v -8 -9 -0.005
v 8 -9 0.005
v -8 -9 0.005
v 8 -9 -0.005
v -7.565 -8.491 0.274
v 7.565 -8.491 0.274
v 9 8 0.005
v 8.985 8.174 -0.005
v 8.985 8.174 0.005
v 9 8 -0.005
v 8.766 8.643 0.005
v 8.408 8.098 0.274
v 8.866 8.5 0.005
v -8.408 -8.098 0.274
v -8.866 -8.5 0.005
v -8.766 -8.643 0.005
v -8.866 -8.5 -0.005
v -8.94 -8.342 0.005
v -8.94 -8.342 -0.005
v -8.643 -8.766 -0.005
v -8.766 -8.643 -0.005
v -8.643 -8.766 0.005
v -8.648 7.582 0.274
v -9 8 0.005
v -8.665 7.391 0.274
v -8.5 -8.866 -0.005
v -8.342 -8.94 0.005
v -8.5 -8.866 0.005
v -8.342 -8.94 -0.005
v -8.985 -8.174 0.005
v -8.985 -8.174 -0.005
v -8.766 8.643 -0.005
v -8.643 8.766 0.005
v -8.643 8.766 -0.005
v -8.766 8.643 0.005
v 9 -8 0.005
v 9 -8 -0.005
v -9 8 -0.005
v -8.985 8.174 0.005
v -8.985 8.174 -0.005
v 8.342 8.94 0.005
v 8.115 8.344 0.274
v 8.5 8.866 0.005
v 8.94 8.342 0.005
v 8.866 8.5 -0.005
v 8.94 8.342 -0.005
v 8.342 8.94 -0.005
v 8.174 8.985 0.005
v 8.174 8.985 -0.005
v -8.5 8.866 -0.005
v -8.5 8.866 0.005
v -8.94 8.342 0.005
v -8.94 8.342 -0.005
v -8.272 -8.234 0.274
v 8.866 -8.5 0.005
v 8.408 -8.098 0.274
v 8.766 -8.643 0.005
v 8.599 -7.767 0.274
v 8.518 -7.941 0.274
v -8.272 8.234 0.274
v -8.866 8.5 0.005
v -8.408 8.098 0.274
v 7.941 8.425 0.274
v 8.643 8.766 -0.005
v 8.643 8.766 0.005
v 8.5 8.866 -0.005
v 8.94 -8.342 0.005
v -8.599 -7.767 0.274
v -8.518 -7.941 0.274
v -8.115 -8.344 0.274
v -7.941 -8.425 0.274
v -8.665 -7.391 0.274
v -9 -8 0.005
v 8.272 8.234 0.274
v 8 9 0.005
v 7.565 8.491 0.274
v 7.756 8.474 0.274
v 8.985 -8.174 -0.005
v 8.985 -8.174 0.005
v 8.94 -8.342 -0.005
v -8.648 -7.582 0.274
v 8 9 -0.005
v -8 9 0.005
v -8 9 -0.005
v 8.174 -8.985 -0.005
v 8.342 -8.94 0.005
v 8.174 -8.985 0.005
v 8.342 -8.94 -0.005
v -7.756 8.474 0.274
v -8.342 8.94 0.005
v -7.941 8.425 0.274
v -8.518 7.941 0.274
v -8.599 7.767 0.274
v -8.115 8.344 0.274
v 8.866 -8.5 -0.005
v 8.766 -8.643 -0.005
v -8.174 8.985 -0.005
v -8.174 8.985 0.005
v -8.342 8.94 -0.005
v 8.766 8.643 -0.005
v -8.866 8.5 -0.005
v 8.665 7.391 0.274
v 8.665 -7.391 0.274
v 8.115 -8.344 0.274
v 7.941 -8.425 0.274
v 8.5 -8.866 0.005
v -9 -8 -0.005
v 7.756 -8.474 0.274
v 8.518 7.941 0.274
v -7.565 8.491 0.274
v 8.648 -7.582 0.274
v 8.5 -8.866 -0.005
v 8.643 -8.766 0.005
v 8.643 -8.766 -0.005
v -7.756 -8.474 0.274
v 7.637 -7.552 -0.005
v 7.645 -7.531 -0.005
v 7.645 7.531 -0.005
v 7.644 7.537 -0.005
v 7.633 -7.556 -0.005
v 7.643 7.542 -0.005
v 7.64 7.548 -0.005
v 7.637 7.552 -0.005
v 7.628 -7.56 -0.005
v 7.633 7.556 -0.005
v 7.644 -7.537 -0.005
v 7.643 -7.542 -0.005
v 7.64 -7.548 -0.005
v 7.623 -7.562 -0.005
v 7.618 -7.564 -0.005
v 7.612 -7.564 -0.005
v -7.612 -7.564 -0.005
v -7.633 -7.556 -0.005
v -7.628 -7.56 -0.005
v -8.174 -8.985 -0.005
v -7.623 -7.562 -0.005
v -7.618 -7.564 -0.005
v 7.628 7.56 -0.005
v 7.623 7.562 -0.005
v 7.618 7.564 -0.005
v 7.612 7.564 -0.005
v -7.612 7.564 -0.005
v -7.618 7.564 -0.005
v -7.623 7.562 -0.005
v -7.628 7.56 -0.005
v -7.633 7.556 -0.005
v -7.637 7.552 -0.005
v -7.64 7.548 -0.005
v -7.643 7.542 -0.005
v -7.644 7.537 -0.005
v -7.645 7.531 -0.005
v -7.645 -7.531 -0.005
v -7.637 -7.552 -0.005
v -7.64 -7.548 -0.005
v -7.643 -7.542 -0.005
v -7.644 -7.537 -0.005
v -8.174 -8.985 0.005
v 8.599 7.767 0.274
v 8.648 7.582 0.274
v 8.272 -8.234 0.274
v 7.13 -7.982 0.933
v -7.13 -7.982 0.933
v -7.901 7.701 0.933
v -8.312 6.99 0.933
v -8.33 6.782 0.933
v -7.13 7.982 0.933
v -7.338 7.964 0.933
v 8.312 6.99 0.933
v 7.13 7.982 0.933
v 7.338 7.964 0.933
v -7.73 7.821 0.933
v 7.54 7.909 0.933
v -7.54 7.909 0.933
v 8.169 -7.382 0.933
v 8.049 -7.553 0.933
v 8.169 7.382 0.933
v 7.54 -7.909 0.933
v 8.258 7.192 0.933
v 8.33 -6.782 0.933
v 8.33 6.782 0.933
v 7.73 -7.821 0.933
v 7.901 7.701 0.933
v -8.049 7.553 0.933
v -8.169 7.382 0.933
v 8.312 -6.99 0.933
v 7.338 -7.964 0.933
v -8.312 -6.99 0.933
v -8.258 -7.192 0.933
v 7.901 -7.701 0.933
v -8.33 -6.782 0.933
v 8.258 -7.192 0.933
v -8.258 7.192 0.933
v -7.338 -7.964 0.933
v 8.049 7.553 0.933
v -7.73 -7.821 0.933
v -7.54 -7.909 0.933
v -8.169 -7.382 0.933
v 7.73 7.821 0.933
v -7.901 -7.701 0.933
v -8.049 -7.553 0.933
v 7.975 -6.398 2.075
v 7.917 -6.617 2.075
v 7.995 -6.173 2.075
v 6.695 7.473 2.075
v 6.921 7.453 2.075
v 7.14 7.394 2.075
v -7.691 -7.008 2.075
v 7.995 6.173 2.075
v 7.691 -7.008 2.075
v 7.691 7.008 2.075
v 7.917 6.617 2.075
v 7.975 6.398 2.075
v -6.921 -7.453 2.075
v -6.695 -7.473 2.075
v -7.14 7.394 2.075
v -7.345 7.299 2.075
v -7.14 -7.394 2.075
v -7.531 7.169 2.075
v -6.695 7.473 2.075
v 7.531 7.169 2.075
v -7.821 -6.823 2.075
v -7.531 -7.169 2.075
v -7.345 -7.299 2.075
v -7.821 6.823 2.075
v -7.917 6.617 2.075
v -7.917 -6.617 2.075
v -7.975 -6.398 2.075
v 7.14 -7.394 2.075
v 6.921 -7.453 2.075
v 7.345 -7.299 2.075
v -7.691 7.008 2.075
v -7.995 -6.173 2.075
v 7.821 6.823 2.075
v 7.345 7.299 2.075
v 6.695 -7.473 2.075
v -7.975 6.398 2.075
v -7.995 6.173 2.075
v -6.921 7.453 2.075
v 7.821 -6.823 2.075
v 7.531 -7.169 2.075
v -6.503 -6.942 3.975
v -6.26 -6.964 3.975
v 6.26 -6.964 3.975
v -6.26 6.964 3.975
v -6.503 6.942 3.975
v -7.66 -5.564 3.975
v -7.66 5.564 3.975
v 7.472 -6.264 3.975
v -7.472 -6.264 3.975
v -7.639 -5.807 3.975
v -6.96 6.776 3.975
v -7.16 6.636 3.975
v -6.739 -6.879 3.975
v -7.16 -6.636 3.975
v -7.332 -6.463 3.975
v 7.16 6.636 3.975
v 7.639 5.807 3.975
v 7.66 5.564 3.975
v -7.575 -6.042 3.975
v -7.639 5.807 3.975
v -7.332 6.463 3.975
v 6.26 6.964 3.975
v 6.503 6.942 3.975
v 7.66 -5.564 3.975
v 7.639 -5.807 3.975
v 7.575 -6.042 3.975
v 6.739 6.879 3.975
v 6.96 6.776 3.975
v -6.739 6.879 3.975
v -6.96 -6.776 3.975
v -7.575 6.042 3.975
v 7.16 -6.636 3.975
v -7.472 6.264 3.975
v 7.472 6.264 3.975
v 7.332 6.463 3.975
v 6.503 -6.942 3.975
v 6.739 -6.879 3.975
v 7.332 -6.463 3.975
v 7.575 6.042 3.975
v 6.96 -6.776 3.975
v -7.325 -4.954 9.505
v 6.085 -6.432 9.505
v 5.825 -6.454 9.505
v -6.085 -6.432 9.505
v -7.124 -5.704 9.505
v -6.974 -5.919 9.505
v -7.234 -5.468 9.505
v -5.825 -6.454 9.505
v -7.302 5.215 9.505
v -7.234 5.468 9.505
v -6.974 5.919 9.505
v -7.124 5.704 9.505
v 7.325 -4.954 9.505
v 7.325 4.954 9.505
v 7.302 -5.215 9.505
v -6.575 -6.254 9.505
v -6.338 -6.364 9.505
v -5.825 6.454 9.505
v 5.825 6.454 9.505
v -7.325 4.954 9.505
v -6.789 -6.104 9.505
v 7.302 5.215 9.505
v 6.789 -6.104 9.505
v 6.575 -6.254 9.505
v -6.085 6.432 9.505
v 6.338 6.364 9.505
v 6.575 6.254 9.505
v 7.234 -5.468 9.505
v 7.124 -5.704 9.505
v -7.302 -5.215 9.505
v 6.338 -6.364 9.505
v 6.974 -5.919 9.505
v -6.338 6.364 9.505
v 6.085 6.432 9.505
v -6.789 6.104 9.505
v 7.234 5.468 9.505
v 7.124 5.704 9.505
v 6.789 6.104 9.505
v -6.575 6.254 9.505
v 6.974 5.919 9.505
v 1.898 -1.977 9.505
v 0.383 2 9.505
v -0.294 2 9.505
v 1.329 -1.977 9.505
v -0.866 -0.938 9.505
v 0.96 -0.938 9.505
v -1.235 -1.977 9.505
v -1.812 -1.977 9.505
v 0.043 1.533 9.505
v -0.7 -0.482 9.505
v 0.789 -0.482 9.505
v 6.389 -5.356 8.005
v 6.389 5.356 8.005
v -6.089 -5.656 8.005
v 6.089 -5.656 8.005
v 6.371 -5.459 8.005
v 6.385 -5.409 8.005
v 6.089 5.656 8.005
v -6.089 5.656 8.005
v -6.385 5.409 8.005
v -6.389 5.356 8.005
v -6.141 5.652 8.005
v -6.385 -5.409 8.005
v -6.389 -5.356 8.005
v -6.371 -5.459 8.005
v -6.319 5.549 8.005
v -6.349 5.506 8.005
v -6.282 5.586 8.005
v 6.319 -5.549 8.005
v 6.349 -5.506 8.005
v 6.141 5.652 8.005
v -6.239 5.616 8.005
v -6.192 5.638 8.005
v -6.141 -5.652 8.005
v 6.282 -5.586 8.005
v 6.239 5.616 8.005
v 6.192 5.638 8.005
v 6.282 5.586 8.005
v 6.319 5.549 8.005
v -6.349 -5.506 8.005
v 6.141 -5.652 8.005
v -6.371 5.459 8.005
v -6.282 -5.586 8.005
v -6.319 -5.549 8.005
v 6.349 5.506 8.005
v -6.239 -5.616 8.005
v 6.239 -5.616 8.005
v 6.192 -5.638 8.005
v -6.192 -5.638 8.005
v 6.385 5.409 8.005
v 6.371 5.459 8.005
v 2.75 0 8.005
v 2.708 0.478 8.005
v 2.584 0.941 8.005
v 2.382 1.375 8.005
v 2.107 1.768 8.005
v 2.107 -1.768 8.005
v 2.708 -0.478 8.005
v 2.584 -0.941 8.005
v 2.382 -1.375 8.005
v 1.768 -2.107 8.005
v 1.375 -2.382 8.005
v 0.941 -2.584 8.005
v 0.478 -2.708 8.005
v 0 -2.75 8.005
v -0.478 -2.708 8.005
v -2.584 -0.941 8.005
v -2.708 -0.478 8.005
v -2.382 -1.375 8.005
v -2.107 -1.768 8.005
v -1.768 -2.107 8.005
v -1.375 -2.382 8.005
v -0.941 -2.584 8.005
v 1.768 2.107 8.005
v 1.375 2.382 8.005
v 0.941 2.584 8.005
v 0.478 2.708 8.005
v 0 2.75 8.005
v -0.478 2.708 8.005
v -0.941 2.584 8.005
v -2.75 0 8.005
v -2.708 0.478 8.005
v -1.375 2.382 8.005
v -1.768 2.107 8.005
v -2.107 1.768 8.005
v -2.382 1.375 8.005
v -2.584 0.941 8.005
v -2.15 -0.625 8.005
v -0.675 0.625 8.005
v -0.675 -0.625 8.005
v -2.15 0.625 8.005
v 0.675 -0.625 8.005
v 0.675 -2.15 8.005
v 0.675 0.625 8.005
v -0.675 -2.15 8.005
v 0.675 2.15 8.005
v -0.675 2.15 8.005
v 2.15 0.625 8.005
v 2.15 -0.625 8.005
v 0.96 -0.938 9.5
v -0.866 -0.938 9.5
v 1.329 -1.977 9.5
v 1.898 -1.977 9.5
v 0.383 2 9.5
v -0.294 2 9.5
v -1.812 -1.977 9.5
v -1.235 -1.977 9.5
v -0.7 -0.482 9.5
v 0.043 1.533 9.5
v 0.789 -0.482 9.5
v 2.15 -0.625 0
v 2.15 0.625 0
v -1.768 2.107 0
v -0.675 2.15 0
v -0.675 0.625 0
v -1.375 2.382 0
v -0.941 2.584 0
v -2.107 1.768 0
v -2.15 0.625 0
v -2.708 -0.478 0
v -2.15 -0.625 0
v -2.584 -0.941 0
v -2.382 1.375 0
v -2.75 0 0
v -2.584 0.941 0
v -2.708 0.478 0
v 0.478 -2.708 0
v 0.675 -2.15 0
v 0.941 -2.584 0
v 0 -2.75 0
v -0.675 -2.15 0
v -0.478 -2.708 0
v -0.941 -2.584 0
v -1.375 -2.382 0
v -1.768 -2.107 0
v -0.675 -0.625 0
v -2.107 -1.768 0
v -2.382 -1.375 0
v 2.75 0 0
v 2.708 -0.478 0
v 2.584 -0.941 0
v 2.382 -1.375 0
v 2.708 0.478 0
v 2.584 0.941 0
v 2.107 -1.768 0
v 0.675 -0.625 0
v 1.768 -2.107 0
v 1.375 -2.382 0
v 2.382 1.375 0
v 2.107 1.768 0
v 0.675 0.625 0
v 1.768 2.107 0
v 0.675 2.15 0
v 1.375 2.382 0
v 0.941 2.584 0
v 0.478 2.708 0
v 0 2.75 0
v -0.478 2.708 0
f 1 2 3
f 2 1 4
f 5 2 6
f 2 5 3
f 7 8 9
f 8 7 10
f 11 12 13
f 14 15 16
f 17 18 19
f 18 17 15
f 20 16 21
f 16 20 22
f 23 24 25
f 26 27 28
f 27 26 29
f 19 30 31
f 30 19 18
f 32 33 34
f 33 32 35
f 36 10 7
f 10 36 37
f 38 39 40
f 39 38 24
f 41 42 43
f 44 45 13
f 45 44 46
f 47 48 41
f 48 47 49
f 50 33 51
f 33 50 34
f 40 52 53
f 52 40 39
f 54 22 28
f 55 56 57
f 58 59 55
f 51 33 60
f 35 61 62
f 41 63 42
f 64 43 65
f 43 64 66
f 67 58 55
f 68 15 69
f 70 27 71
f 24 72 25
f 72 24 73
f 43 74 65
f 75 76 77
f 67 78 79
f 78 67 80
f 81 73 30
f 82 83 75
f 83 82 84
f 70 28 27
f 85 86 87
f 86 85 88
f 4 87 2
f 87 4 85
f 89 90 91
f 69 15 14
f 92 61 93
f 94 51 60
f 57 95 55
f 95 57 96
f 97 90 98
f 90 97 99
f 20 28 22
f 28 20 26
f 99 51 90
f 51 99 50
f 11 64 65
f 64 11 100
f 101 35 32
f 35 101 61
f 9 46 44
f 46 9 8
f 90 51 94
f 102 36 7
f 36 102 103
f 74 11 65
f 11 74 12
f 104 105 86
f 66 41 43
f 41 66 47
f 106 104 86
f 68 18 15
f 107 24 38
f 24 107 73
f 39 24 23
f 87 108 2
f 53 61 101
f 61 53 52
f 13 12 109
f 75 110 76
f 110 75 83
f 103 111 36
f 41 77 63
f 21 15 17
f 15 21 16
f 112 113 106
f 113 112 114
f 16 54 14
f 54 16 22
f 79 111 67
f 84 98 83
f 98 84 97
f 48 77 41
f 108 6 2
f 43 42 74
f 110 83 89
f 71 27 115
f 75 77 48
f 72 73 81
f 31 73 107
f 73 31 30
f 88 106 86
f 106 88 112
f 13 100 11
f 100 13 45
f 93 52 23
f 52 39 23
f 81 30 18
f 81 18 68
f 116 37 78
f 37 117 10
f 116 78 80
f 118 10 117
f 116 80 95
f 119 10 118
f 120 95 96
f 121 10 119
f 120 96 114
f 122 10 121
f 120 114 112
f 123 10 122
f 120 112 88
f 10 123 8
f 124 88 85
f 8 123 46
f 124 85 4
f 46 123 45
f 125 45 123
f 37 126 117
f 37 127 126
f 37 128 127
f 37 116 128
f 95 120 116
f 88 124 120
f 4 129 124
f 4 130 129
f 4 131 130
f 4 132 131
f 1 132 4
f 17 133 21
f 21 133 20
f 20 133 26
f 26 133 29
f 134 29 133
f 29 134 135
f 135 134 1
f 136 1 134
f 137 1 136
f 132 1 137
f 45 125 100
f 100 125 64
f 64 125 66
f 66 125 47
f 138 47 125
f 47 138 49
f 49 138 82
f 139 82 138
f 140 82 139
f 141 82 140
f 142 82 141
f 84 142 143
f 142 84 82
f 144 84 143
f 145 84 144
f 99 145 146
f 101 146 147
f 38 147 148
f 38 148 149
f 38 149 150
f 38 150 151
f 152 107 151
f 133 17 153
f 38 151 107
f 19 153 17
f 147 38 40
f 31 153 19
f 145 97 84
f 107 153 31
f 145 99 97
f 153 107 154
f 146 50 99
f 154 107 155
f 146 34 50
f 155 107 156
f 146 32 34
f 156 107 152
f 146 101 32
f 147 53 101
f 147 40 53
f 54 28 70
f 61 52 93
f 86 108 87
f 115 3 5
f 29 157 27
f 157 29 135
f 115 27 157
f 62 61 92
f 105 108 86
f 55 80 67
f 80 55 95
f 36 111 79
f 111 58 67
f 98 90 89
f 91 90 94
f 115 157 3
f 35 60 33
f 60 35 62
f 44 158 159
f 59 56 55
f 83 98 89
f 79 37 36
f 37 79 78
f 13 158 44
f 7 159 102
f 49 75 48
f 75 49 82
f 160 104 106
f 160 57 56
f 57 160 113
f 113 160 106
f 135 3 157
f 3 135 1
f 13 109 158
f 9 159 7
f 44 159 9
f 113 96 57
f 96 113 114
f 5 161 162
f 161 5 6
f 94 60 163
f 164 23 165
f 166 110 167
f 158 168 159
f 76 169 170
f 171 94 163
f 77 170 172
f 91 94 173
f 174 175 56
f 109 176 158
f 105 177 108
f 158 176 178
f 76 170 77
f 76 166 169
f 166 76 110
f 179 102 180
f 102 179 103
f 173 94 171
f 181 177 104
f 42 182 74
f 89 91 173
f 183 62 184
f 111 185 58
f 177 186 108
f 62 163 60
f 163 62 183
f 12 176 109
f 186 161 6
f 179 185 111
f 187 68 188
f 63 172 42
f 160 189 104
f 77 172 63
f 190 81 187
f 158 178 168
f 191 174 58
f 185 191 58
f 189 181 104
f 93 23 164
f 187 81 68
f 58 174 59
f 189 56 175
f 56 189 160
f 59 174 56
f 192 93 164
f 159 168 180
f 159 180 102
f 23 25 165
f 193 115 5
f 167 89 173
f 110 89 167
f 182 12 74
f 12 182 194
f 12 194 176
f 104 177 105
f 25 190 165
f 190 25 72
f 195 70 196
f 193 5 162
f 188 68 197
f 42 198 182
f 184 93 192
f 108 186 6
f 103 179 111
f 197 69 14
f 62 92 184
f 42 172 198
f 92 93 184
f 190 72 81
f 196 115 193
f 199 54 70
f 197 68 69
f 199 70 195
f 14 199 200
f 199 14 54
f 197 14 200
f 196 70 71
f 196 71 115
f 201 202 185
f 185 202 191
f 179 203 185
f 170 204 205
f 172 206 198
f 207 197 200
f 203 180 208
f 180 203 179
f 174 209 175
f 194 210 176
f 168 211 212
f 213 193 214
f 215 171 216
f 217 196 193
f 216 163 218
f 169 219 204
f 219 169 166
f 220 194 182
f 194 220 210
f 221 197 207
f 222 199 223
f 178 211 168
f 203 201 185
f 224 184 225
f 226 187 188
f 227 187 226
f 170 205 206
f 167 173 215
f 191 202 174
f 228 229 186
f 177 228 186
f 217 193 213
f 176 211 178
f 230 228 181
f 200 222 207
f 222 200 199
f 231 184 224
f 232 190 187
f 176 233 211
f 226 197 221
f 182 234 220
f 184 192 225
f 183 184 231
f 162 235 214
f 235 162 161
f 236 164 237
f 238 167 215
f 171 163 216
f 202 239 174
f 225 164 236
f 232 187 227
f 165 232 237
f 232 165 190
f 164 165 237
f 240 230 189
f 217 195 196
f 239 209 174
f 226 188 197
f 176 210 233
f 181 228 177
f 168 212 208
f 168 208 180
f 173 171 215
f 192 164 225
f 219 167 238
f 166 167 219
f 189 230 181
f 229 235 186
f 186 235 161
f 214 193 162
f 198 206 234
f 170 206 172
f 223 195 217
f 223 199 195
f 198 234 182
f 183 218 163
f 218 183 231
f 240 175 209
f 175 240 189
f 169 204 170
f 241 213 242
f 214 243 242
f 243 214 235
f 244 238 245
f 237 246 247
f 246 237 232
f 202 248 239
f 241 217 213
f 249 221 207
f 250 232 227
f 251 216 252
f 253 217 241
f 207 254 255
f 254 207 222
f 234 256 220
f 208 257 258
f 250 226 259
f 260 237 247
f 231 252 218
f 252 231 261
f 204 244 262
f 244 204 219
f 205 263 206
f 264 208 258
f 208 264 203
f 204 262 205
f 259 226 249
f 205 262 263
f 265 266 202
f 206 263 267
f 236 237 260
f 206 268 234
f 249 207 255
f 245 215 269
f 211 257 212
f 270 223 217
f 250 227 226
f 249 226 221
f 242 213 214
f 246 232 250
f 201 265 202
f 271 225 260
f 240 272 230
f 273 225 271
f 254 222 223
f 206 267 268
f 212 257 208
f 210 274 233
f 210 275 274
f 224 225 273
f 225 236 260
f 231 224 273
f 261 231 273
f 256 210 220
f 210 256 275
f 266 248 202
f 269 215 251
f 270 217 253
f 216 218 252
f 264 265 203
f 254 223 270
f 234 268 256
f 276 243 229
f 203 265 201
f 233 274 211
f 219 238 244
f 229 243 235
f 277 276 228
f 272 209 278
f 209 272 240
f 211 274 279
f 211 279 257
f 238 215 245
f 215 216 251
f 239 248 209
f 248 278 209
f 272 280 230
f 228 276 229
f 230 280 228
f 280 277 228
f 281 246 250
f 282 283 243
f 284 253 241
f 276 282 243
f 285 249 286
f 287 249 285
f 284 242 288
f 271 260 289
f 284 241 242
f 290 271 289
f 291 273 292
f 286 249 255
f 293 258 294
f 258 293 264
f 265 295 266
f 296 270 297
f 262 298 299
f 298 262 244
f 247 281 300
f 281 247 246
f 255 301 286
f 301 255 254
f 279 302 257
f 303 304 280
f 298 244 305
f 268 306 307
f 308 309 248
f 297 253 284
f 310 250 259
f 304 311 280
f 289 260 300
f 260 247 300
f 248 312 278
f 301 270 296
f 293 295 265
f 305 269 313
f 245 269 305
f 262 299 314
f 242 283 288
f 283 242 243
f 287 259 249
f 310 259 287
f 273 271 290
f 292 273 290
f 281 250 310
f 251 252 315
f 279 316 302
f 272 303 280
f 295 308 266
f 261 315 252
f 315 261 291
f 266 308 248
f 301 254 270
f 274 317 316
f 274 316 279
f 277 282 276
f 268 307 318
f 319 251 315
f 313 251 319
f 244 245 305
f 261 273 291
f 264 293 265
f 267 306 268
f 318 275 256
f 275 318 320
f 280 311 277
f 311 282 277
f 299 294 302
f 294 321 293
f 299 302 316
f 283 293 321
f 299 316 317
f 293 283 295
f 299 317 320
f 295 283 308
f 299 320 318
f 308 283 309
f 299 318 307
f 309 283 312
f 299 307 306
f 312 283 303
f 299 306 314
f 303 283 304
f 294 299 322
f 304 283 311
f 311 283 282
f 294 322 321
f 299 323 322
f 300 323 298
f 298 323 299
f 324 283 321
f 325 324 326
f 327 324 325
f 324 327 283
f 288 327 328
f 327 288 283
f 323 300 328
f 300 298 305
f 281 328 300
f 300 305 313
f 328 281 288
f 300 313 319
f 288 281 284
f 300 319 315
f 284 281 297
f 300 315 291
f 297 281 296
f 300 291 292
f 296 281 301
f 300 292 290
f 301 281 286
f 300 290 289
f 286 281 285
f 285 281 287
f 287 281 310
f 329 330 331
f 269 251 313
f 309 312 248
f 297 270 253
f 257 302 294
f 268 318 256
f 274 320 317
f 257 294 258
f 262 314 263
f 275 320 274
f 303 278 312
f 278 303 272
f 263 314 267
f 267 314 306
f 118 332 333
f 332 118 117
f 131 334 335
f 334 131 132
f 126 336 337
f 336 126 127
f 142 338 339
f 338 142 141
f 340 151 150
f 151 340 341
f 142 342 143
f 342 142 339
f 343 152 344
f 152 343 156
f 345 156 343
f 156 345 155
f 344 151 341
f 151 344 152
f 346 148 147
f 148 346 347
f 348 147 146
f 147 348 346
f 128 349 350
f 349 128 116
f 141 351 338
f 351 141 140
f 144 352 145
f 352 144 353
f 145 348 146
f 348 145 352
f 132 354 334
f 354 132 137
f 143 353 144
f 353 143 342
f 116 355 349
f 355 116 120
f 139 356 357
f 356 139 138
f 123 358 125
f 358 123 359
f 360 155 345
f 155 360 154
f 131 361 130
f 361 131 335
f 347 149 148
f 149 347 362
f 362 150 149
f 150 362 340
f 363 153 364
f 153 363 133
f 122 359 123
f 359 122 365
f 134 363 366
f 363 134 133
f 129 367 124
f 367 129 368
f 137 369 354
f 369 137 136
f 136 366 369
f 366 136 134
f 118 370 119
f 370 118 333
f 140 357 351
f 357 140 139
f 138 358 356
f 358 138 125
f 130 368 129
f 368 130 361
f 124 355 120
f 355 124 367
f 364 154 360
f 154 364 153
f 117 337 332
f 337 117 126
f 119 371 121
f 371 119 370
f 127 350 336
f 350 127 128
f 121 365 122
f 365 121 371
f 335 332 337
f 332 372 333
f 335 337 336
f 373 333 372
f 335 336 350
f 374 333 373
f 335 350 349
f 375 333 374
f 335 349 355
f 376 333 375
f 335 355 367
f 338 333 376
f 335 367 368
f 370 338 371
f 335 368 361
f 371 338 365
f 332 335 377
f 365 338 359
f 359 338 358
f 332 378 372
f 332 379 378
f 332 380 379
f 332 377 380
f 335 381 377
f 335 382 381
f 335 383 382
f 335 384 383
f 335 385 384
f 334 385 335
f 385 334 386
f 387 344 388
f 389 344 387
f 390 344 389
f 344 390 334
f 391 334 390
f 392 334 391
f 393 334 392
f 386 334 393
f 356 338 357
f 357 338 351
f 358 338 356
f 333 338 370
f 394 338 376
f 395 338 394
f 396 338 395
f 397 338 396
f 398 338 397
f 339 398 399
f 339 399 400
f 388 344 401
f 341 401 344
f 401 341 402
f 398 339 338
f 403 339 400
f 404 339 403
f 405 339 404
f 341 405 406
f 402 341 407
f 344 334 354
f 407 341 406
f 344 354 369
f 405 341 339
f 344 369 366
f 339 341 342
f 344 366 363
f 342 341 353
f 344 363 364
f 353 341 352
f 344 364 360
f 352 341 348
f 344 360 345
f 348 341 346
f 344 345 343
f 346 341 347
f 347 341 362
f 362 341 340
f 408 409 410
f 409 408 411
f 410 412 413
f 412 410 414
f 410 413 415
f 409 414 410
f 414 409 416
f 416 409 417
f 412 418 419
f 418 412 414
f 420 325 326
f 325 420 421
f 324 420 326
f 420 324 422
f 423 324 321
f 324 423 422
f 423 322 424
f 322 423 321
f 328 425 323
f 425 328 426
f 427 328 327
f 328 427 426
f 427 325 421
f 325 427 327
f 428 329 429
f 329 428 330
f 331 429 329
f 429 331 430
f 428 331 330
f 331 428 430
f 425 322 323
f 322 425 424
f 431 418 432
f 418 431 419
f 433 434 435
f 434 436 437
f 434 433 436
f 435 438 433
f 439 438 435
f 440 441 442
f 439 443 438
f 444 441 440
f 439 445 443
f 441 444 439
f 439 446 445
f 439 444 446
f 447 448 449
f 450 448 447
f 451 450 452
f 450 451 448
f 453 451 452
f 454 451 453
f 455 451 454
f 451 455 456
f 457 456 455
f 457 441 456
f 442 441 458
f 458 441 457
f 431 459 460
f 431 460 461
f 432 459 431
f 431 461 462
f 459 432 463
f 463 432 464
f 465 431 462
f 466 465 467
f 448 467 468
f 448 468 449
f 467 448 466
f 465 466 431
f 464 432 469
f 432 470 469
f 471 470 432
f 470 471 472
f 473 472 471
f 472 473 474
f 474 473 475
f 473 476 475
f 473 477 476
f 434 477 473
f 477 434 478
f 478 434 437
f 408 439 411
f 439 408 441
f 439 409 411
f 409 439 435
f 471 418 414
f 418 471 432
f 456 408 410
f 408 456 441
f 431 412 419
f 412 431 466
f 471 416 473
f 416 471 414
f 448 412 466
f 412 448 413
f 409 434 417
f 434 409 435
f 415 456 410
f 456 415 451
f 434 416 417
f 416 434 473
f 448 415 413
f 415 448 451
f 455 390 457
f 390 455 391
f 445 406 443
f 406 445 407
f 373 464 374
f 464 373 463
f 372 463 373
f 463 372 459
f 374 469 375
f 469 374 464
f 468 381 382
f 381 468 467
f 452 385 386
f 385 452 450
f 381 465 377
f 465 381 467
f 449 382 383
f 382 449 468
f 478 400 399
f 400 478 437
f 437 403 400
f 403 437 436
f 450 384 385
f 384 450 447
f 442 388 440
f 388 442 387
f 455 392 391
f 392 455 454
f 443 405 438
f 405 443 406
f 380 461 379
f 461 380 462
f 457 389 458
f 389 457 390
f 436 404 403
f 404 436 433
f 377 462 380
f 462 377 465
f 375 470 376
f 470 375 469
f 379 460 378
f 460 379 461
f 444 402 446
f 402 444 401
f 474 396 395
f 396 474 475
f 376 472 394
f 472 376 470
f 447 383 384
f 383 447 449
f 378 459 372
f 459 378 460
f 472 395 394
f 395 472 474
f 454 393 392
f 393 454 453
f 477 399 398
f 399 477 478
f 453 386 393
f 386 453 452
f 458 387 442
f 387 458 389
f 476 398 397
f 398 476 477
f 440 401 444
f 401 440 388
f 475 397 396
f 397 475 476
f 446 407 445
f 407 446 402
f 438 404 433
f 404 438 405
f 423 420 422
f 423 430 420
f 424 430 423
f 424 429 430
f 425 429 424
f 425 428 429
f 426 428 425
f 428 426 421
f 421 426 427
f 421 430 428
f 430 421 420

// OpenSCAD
export_target = "preview";
include <common/custom-shell-params.scad>

user_top_scale = 0.75;
user_keycap_shoulder_radius = -1.6;

include <../base/keycap.scad>
